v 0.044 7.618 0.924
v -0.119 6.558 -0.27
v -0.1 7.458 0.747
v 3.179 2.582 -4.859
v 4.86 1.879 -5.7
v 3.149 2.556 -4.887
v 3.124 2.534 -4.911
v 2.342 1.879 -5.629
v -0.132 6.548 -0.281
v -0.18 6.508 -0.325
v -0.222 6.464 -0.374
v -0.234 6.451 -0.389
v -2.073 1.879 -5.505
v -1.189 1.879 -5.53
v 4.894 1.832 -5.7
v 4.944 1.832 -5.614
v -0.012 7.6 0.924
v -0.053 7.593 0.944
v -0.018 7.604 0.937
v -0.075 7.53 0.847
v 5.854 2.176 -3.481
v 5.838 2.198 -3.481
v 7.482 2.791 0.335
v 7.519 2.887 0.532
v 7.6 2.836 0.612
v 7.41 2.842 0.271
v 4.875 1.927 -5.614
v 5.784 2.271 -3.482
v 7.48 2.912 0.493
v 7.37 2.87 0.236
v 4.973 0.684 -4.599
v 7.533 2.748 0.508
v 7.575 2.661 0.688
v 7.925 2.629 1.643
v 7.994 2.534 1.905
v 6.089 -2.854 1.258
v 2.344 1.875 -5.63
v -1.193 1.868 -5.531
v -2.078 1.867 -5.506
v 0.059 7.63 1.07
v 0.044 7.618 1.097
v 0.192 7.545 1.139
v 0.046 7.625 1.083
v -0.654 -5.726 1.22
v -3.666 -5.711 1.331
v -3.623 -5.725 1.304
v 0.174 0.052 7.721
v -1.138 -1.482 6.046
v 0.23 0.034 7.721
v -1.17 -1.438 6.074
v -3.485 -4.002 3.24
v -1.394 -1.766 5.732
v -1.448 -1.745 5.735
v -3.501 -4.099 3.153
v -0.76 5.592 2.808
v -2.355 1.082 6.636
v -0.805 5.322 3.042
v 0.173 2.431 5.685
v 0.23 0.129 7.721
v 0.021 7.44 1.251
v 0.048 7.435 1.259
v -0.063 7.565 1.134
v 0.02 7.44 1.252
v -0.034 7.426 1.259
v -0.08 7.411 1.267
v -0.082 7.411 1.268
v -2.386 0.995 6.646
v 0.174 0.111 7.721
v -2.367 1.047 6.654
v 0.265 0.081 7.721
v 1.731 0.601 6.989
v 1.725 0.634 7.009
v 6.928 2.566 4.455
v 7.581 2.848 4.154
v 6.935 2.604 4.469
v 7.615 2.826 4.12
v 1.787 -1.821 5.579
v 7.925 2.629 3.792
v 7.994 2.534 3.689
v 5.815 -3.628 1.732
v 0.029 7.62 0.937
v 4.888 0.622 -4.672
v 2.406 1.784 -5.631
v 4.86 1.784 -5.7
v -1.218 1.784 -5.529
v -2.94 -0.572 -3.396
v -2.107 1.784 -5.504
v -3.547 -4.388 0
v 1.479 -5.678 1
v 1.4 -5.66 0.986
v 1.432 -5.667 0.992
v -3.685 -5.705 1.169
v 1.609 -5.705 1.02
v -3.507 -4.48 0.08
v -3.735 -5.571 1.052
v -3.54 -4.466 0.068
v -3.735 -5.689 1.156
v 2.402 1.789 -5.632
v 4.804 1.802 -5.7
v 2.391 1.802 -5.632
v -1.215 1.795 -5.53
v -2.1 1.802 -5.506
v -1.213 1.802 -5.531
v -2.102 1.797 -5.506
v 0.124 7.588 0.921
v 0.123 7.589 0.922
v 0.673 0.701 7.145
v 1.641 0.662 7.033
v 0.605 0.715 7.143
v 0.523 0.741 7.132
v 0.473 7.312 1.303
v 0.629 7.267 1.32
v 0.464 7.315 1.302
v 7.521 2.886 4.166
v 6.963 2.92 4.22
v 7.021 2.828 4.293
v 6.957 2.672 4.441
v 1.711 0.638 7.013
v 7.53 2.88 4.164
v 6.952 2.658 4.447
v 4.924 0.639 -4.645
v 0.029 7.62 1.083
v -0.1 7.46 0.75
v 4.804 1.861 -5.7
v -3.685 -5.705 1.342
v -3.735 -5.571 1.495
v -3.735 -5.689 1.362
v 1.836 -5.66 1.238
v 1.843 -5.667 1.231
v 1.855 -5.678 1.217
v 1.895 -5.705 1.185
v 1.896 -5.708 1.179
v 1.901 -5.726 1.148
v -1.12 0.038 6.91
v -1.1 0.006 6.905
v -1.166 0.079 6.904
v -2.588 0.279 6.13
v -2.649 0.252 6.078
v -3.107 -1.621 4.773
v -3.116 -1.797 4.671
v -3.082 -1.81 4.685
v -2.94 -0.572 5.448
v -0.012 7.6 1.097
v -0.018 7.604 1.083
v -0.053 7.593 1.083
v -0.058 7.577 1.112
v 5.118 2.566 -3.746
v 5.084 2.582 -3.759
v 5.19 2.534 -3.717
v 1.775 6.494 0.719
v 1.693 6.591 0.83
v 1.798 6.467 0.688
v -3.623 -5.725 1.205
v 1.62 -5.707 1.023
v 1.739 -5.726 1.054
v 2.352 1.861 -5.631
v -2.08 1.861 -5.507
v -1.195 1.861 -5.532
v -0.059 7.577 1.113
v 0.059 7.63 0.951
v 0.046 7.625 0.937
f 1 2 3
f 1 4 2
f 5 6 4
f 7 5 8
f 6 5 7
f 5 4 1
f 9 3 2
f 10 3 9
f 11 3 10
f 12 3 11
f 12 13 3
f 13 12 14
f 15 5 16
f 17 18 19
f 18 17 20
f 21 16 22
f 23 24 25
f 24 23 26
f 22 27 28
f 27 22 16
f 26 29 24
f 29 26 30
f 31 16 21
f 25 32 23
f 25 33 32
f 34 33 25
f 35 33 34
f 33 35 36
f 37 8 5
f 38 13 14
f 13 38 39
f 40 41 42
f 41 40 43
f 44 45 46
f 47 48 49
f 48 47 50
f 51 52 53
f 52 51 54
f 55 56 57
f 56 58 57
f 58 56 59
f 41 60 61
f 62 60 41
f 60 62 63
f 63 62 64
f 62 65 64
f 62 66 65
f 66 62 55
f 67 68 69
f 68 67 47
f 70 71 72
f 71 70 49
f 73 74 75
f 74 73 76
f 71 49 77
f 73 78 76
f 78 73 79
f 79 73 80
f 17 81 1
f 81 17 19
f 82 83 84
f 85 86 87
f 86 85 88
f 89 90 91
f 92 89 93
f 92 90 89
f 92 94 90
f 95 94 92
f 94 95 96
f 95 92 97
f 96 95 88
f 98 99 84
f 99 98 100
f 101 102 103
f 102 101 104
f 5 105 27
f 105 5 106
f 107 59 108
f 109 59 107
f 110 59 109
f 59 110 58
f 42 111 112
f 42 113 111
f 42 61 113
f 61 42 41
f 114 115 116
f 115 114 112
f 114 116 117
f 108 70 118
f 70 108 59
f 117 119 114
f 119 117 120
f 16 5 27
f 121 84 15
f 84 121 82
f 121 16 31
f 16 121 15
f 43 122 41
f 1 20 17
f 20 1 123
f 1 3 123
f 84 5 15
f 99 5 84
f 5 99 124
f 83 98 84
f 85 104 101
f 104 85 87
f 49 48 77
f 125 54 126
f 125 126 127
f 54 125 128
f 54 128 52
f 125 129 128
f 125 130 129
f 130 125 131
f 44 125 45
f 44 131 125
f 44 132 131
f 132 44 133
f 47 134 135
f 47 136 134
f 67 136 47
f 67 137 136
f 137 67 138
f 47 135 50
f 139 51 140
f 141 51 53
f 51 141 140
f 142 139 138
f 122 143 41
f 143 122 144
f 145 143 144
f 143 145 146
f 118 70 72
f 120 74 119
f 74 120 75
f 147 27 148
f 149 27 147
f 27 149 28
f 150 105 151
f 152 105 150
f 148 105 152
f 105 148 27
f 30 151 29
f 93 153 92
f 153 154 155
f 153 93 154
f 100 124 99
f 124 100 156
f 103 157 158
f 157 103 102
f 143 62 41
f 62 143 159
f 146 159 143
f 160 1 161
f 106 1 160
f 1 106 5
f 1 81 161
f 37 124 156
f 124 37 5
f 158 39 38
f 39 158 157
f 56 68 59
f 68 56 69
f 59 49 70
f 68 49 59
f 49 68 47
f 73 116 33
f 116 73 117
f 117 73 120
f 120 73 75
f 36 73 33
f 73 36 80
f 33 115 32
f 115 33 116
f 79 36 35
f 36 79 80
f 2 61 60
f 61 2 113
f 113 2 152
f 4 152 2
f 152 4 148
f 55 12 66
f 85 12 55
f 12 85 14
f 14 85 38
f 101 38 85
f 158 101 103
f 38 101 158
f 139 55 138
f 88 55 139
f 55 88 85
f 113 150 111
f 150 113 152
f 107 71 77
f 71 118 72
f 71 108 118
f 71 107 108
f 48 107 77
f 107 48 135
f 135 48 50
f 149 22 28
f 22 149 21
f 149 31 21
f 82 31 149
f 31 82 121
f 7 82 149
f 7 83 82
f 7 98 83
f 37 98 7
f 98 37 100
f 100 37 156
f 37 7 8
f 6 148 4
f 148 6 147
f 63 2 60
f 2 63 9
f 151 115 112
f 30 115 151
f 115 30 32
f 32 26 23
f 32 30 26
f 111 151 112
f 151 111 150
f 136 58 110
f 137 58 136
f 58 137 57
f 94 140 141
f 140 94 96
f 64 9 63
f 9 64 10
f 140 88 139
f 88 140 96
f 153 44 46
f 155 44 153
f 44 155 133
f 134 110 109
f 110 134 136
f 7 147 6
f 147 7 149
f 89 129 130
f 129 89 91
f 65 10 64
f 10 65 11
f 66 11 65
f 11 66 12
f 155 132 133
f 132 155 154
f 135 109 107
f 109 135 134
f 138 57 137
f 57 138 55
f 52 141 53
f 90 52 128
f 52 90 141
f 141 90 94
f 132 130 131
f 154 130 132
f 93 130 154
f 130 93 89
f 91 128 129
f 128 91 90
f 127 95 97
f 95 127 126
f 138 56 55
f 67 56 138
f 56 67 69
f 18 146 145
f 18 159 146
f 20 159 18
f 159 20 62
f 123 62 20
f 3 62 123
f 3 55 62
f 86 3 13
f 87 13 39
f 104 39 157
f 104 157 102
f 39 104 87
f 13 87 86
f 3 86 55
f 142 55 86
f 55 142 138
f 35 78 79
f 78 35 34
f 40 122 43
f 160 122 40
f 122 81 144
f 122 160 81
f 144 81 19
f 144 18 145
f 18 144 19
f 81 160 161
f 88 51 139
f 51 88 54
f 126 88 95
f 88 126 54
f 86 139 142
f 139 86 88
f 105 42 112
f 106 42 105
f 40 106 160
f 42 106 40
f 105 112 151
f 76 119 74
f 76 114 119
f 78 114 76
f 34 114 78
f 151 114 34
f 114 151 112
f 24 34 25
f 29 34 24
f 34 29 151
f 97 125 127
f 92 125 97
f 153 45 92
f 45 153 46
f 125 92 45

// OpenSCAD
// Auto-generated OpenSCAD file

    inner_points = 10*[[-0.36537328936366986, -0.5630248957199848, -0.2041241481408165], [-0.07665632407859727, 0.2534568958636895, -0.7041241461097079], [-0.28588836871909684, -0.06302896737091813, 0.6582482882371564], [0.0028285965659757967, 0.7534528242127562, 0.15824829026826498], [0.5006521103988715, -0.5630692614318152, 0.29587585685699724], [0.7893690756839442, 0.25341253015185916, -0.20412414111189417], [0.5006521161698728, -0.5630692609848701, -0.7041241431430026], [0.6377433254045676, 0.299296152151859, 0.7832482937293753]];

    outer_points = 10*[[0.5030398526543044, -0.5657546721443936, 0.10102420958195456], [0.4844053090391255, 0.18317157791304, -0.5613670839592305], [-0.49656467091517004, -0.5657546721443936, 0.12914531303547902], [-0.515199214530349, 0.18317157791304, -0.533245980505706], [0.021476633683634054, 0.008119969202636801, 0.763417417694344], [0.002842090068455094, 0.7570462192600704, 0.10102612415315894], [0.872517286240693, 0.3299291148283261, 0.34848527687259606], [-0.8515454892055908, 0.3299291148283261, 0.39698700583193464]];

    // Convex hull for inner set (I)
    module inner_hull() {
        hull() {
            for (p = inner_points) {
                translate(p) sphere(r=0.1);
            }
        }
    }

    // Convex hull for outer set (O) minus inner hull (O \ I)
    module outer_minus_inner() {
        difference() {
            hull() {
                for (p = outer_points) {
                    translate(p) sphere(r=0.1);
                }
            }
            inner_hull(); // Subtract inner hull
        }
    }

    // Convex hull for outer set (O) minus all translated inner hulls
    module outer_minus_AllTranslationInner() {
        difference() {
            hull() {
                for (p = outer_points) {
                    translate(p) sphere(r=0.1);
                }
            }
            hull() {
                translate([0,0,50]) inner_hull();
                translate([0,0,-50]) inner_hull();
            }; // Subtract translated inner hulls
        }
    }

    // Difference between outer_minus_inner and outer_minus_AllTranslationInner
    module outer_minus_inner_diff() {
        difference() {
            // Outer minus inner
            difference() {
                hull() {
                    for (p = outer_points) {
                        translate(p) sphere(r=0.1);
                    }
                }
                inner_hull();
            }

            // Subtract Outer minus AllTranslationInner
            difference() {
                hull() {
                    for (p = outer_points) {
                        translate(p) sphere(r=0.1);
                    }
                }
                hull() {
                    translate([0,0,50]) inner_hull();
                    translate([0,0,-50]) inner_hull();
                };
            }
        }
    }

    // Rendering all with colors applied
    color([1, 1, 0, 1]) outer_minus_inner_diff(); // Opaque yellow
    
